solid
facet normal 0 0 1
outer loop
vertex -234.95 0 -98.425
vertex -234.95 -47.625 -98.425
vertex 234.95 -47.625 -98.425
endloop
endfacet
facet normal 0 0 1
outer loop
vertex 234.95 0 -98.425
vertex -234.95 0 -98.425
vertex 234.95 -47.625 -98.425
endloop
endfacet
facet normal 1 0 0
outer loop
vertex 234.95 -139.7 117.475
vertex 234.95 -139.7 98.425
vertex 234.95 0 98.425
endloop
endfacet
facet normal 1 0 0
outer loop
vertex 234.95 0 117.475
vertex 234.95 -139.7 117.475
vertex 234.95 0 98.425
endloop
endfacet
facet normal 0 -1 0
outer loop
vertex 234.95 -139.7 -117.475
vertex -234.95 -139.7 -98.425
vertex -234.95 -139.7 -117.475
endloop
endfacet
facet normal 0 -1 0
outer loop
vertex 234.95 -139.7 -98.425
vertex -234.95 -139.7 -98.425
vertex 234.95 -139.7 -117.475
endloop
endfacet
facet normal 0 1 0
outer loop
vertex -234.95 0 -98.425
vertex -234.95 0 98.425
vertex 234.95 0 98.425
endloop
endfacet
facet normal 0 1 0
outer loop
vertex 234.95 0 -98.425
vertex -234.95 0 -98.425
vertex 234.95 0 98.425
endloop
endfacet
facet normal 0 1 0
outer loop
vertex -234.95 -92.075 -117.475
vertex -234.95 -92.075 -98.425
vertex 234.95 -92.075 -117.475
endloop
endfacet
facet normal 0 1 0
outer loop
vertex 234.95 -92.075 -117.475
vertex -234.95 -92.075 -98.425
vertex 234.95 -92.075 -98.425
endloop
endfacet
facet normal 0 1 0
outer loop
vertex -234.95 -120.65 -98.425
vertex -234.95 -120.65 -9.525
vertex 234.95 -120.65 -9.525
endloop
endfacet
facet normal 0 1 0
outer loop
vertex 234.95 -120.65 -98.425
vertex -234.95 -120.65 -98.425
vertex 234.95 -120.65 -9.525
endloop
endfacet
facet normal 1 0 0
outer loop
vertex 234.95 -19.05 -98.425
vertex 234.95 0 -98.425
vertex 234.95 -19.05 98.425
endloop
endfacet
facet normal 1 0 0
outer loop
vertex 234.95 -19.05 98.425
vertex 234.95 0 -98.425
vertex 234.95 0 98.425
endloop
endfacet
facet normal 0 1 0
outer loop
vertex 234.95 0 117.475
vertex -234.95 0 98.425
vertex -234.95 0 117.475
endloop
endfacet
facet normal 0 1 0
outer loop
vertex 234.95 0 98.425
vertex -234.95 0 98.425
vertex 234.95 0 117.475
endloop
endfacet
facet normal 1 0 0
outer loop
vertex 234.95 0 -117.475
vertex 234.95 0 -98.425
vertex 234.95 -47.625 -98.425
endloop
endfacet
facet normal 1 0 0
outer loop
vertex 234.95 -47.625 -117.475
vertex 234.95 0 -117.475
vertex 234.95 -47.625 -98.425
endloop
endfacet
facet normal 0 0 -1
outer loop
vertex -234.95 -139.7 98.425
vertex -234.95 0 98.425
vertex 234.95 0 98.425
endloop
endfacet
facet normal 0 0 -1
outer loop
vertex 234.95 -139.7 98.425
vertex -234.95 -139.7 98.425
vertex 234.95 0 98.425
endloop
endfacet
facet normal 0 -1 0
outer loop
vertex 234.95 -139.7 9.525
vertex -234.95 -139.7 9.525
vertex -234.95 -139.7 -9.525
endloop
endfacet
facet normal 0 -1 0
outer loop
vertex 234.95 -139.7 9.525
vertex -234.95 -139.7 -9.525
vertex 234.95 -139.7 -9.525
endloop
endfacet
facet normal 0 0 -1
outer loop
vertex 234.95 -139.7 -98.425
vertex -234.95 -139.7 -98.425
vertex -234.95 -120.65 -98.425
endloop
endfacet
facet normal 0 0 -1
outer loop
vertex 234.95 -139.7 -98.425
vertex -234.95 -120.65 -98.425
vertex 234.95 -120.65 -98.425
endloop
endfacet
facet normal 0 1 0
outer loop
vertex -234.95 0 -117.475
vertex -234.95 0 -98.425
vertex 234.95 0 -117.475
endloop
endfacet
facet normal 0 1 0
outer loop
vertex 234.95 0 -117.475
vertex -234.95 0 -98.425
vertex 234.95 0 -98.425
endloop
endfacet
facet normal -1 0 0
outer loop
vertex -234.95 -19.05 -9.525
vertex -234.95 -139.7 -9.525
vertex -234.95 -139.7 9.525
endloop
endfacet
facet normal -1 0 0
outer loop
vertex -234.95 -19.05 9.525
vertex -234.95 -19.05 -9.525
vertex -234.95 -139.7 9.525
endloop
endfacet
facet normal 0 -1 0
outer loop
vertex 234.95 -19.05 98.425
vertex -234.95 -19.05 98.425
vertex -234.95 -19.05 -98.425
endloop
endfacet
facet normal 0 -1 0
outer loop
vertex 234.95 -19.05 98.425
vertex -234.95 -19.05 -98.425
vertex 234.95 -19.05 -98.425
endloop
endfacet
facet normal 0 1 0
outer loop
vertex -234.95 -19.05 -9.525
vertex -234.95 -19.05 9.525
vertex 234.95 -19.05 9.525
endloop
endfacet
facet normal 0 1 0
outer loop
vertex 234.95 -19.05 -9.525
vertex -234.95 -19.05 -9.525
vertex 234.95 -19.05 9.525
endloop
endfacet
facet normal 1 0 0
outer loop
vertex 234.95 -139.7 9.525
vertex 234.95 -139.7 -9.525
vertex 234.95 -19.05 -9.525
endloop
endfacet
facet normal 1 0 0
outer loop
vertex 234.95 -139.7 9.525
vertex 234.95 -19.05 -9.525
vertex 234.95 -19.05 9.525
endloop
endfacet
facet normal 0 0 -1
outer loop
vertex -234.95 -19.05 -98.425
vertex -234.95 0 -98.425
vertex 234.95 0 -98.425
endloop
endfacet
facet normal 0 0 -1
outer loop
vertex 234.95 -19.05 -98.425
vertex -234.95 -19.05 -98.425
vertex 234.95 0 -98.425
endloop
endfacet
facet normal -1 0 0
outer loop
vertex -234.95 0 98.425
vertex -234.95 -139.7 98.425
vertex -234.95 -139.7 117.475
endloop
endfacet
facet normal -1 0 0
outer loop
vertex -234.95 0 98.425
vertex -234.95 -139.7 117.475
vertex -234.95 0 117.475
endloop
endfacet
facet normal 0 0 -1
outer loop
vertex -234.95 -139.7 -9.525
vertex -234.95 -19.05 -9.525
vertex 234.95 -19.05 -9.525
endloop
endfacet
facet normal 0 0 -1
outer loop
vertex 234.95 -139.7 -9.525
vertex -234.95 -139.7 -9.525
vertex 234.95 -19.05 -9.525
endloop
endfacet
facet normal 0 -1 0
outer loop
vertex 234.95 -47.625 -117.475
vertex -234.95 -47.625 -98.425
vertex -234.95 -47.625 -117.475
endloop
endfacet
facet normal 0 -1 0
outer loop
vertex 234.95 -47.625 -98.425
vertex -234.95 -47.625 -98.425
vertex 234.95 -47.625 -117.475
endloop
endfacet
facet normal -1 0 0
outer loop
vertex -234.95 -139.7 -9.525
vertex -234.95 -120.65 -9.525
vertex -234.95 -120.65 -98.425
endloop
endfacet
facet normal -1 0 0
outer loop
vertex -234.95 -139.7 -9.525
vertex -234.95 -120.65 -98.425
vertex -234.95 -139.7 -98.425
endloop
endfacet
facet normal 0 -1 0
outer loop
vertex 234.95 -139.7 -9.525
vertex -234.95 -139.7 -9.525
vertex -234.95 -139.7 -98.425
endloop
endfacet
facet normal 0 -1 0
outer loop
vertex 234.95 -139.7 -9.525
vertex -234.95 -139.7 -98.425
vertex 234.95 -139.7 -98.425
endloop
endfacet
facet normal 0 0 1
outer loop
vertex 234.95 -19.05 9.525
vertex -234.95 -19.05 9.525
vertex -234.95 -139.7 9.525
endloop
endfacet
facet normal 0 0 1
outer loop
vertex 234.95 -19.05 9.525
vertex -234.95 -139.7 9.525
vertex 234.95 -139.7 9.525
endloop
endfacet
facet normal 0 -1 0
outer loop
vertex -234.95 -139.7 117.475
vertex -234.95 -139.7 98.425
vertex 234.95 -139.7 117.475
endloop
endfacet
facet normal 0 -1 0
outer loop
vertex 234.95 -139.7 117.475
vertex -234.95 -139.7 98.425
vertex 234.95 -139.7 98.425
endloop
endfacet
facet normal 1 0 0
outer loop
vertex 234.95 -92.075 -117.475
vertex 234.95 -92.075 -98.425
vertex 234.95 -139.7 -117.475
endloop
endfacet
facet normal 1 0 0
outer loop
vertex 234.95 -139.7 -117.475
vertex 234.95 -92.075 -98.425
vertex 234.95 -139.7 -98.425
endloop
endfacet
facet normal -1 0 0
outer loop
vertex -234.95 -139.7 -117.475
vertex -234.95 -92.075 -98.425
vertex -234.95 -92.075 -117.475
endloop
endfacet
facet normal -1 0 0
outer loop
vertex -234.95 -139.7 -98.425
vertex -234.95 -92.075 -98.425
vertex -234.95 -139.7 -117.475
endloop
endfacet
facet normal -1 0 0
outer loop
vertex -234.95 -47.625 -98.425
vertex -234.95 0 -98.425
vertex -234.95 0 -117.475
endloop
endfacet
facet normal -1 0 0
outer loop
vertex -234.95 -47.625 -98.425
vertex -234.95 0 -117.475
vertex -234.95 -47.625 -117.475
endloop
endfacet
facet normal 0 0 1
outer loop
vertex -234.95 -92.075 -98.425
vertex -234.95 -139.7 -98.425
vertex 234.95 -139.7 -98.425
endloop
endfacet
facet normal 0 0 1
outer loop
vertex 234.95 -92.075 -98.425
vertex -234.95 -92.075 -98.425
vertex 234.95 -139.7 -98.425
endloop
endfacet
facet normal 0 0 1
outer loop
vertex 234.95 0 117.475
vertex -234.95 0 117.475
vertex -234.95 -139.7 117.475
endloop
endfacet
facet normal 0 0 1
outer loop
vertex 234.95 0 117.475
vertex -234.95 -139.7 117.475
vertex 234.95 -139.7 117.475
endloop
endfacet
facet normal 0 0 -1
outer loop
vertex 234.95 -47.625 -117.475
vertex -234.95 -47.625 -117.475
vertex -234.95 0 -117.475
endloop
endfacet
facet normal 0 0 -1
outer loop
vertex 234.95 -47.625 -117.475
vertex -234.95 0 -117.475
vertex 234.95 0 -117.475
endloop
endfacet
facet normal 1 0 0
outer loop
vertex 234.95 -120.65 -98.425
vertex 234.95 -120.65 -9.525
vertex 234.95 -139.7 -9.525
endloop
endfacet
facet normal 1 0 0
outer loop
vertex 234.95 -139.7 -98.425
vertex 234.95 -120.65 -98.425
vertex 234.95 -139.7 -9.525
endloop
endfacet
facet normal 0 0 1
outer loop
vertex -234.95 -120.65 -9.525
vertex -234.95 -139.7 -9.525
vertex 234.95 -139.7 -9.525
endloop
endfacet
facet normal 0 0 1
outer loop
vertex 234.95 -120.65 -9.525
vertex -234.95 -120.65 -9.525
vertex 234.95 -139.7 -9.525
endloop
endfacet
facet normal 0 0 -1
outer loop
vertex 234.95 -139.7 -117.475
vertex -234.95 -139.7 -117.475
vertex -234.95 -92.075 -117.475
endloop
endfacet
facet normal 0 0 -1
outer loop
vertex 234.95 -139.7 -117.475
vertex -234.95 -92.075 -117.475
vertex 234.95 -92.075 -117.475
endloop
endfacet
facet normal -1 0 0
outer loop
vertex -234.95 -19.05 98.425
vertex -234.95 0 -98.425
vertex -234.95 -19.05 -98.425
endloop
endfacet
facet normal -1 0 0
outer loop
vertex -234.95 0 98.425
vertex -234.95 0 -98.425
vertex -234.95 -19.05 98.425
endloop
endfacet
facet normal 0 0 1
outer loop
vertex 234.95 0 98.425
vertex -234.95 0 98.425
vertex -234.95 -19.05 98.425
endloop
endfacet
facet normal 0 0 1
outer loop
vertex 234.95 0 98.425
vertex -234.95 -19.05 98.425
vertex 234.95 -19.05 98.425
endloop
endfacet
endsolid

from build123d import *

# Parameters (mm, degrees)
F0_W      = 469.9
F0_H      = 196.85
F1_DEPTH  = 19.05
F2_W      = 469.9
F2_H      = 19.05
F3_DEPTH  = 120.65
F4_W      = 469.9
F4_H      = 19.05
F5_DEPTH  = 88.9
F6_W      = 469.9
F6_H      = 47.625
F7_DEPTH  = 19.05
F8_W      = 469.9
F8_H      = 47.625
F9_DEPTH  = 19.05
F10_W     = 469.9
F10_H     = 139.7
F11_DEPTH = 19.05


with BuildPart() as f1:
    # F0 (on Front) → F1 (new body)
    with BuildSketch(Plane.XZ):
        Rectangle(F0_W, F0_H)
    extrude(amount=F1_DEPTH)


with BuildPart() as f3:
    # F2 (on face) → F3 (new body)
    with BuildSketch(Plane.XZ.offset(19.05)):
        Rectangle(F2_W, F2_H)
    extrude(amount=F3_DEPTH)


with BuildPart() as f5:
    # F4 (on face) → F5 (new body)
    with BuildSketch(Plane(origin=(0, 0, -9.525), x_dir=(1, 0, 0), z_dir=(0, 0, -1))):
        with Locations((0, 130.175)):
            Rectangle(F4_W, F4_H)
    extrude(amount=F5_DEPTH)


with BuildPart() as f7:
    # F6 (on face) → F7 (new body)
    with BuildSketch(Plane(origin=(0, 0, -98.425), x_dir=(1, 0, 0), z_dir=(0, 0, -1))):
        with Locations((0, 23.8125)):
            Rectangle(F6_W, F6_H)
    extrude(amount=F7_DEPTH)


with BuildPart() as f9:
    # F8 (on face) → F9 (new body)
    with BuildSketch(Plane(origin=(0, 0, -98.425), x_dir=(1, 0, 0), z_dir=(0, 0, -1))):
        with Locations((0, 115.8875)):
            Rectangle(F8_W, F8_H)
    extrude(amount=F9_DEPTH)


with BuildPart() as f11:
    # F10 (on face) → F11 (new body)
    with BuildSketch(Plane.XY.offset(98.425)):
        with Locations((0, -69.85)):
            Rectangle(F10_W, F10_H)
    extrude(amount=F11_DEPTH)


solid = Compound([f1.part, f3.part, f5.part, f7.part, f9.part, f11.part])
